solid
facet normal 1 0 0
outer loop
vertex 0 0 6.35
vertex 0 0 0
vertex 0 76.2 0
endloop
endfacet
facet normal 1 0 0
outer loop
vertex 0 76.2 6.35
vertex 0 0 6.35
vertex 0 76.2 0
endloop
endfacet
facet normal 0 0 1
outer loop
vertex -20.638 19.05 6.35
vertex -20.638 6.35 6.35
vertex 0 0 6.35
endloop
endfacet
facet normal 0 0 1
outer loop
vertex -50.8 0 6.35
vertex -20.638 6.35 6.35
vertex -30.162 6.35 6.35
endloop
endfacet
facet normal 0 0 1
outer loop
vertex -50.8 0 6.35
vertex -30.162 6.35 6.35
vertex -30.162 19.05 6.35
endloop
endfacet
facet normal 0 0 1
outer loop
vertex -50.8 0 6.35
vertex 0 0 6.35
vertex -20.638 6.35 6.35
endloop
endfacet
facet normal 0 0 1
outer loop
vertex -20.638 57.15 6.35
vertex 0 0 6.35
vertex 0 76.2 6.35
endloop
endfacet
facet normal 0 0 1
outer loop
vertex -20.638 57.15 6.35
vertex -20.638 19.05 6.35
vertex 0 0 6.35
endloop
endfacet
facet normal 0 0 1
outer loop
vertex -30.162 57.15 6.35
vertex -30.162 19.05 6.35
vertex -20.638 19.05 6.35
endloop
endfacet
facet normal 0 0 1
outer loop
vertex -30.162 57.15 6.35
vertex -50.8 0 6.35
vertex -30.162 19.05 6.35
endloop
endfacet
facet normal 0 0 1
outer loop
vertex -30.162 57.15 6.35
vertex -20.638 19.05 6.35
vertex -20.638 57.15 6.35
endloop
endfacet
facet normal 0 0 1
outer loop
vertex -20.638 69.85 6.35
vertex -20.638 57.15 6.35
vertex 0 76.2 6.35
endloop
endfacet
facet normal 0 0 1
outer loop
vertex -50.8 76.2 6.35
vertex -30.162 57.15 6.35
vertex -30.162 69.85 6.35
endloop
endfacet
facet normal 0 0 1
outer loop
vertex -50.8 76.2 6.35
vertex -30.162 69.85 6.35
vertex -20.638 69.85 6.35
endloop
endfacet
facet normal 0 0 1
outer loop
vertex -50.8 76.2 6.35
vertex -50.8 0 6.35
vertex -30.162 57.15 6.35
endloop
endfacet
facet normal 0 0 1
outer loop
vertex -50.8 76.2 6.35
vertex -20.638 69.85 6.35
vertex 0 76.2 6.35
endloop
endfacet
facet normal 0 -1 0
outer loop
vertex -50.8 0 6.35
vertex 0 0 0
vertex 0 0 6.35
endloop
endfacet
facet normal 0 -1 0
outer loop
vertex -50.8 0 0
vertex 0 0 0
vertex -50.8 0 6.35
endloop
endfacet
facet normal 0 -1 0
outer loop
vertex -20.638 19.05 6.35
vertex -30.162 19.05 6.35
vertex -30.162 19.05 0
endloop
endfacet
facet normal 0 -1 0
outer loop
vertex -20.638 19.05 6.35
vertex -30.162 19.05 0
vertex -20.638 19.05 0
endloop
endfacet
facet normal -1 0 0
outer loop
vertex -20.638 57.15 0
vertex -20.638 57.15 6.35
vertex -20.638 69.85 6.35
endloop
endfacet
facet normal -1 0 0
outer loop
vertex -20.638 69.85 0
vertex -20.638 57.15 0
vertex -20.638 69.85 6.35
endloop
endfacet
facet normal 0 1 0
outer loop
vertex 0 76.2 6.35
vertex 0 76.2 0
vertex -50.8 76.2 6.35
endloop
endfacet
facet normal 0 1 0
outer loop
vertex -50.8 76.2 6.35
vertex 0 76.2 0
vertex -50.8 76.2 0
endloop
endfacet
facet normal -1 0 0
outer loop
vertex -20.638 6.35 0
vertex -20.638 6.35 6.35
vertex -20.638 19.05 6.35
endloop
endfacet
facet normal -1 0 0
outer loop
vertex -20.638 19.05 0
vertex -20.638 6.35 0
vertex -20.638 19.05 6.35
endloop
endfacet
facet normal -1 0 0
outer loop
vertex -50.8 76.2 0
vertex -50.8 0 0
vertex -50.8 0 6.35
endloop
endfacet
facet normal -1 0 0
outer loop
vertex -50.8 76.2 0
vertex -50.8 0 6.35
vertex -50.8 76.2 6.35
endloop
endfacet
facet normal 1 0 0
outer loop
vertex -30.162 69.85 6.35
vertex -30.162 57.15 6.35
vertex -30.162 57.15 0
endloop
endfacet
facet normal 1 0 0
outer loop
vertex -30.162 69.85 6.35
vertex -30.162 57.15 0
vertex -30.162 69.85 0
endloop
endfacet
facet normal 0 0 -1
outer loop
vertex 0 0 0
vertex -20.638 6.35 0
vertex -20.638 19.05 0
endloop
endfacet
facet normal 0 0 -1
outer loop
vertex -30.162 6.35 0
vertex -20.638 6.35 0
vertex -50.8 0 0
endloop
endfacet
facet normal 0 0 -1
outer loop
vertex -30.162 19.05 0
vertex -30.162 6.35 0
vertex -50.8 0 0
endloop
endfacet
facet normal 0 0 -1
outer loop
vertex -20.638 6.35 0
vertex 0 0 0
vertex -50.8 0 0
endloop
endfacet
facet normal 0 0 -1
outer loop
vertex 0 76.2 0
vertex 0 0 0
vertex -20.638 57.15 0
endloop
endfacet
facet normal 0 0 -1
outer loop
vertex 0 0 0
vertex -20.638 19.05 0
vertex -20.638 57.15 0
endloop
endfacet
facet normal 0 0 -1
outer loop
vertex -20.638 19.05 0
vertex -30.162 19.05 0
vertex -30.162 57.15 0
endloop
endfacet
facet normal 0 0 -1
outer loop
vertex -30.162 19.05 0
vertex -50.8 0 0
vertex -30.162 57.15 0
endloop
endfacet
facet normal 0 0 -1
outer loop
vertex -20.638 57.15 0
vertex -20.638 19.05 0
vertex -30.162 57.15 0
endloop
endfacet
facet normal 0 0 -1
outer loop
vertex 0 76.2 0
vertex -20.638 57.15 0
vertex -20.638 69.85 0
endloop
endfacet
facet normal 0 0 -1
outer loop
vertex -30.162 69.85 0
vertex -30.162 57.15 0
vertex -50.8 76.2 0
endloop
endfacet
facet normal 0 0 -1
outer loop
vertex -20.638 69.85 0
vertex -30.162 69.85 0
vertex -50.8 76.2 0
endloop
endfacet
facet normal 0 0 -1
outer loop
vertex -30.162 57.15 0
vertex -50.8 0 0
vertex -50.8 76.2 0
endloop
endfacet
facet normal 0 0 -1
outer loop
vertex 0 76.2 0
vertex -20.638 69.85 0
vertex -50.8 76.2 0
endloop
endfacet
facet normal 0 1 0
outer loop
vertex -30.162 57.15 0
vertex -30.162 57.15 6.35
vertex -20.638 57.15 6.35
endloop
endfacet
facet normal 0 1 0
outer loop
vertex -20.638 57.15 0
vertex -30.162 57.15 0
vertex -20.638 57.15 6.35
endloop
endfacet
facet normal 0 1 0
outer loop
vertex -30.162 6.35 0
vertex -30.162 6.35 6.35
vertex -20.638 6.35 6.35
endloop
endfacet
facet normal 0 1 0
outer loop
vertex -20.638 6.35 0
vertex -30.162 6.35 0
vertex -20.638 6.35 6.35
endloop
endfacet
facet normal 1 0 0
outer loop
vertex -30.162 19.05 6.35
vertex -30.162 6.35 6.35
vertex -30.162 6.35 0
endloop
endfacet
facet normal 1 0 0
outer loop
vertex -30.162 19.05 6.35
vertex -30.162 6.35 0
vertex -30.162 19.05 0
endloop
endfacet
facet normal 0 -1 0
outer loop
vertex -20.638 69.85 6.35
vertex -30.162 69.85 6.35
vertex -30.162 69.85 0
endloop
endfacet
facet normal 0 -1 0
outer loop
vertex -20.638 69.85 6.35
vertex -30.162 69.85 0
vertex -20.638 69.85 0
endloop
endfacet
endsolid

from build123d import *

# Parameters (mm, degrees)
SKETCH1_W           = 76.2
SKETCH1_H           = 50.8
BOSS_EXTRUDE1_DEPTH = 6.35
SKETCH2_W           = 9.525
SKETCH2_H           = 12.7
CUT_EXTRUDE1_DEPTH  = 92.800885072


with BuildPart() as part:
    # Sketch1 → Boss-Extrude1 (new body)
    with BuildSketch(Plane(origin=(0, 0, 0), x_dir=(0, 1, 0), z_dir=(0, 0, 1))):
        with Locations((38.1, 25.4)):
            Rectangle(SKETCH1_W, SKETCH1_H)
    extrude(amount=BOSS_EXTRUDE1_DEPTH)

    # Sketch2 → Cut-Extrude1 (cut, through all)
    with BuildSketch(Plane.XY.offset(6.35)):
        with Locations((-25.4, 12.7)):
            Rectangle(SKETCH2_W, SKETCH2_H)
        with Locations((-25.4, 63.5)):
            Rectangle(SKETCH2_W, SKETCH2_H)
    extrude(amount=-CUT_EXTRUDE1_DEPTH, mode=Mode.SUBTRACT)


solid = part.part
